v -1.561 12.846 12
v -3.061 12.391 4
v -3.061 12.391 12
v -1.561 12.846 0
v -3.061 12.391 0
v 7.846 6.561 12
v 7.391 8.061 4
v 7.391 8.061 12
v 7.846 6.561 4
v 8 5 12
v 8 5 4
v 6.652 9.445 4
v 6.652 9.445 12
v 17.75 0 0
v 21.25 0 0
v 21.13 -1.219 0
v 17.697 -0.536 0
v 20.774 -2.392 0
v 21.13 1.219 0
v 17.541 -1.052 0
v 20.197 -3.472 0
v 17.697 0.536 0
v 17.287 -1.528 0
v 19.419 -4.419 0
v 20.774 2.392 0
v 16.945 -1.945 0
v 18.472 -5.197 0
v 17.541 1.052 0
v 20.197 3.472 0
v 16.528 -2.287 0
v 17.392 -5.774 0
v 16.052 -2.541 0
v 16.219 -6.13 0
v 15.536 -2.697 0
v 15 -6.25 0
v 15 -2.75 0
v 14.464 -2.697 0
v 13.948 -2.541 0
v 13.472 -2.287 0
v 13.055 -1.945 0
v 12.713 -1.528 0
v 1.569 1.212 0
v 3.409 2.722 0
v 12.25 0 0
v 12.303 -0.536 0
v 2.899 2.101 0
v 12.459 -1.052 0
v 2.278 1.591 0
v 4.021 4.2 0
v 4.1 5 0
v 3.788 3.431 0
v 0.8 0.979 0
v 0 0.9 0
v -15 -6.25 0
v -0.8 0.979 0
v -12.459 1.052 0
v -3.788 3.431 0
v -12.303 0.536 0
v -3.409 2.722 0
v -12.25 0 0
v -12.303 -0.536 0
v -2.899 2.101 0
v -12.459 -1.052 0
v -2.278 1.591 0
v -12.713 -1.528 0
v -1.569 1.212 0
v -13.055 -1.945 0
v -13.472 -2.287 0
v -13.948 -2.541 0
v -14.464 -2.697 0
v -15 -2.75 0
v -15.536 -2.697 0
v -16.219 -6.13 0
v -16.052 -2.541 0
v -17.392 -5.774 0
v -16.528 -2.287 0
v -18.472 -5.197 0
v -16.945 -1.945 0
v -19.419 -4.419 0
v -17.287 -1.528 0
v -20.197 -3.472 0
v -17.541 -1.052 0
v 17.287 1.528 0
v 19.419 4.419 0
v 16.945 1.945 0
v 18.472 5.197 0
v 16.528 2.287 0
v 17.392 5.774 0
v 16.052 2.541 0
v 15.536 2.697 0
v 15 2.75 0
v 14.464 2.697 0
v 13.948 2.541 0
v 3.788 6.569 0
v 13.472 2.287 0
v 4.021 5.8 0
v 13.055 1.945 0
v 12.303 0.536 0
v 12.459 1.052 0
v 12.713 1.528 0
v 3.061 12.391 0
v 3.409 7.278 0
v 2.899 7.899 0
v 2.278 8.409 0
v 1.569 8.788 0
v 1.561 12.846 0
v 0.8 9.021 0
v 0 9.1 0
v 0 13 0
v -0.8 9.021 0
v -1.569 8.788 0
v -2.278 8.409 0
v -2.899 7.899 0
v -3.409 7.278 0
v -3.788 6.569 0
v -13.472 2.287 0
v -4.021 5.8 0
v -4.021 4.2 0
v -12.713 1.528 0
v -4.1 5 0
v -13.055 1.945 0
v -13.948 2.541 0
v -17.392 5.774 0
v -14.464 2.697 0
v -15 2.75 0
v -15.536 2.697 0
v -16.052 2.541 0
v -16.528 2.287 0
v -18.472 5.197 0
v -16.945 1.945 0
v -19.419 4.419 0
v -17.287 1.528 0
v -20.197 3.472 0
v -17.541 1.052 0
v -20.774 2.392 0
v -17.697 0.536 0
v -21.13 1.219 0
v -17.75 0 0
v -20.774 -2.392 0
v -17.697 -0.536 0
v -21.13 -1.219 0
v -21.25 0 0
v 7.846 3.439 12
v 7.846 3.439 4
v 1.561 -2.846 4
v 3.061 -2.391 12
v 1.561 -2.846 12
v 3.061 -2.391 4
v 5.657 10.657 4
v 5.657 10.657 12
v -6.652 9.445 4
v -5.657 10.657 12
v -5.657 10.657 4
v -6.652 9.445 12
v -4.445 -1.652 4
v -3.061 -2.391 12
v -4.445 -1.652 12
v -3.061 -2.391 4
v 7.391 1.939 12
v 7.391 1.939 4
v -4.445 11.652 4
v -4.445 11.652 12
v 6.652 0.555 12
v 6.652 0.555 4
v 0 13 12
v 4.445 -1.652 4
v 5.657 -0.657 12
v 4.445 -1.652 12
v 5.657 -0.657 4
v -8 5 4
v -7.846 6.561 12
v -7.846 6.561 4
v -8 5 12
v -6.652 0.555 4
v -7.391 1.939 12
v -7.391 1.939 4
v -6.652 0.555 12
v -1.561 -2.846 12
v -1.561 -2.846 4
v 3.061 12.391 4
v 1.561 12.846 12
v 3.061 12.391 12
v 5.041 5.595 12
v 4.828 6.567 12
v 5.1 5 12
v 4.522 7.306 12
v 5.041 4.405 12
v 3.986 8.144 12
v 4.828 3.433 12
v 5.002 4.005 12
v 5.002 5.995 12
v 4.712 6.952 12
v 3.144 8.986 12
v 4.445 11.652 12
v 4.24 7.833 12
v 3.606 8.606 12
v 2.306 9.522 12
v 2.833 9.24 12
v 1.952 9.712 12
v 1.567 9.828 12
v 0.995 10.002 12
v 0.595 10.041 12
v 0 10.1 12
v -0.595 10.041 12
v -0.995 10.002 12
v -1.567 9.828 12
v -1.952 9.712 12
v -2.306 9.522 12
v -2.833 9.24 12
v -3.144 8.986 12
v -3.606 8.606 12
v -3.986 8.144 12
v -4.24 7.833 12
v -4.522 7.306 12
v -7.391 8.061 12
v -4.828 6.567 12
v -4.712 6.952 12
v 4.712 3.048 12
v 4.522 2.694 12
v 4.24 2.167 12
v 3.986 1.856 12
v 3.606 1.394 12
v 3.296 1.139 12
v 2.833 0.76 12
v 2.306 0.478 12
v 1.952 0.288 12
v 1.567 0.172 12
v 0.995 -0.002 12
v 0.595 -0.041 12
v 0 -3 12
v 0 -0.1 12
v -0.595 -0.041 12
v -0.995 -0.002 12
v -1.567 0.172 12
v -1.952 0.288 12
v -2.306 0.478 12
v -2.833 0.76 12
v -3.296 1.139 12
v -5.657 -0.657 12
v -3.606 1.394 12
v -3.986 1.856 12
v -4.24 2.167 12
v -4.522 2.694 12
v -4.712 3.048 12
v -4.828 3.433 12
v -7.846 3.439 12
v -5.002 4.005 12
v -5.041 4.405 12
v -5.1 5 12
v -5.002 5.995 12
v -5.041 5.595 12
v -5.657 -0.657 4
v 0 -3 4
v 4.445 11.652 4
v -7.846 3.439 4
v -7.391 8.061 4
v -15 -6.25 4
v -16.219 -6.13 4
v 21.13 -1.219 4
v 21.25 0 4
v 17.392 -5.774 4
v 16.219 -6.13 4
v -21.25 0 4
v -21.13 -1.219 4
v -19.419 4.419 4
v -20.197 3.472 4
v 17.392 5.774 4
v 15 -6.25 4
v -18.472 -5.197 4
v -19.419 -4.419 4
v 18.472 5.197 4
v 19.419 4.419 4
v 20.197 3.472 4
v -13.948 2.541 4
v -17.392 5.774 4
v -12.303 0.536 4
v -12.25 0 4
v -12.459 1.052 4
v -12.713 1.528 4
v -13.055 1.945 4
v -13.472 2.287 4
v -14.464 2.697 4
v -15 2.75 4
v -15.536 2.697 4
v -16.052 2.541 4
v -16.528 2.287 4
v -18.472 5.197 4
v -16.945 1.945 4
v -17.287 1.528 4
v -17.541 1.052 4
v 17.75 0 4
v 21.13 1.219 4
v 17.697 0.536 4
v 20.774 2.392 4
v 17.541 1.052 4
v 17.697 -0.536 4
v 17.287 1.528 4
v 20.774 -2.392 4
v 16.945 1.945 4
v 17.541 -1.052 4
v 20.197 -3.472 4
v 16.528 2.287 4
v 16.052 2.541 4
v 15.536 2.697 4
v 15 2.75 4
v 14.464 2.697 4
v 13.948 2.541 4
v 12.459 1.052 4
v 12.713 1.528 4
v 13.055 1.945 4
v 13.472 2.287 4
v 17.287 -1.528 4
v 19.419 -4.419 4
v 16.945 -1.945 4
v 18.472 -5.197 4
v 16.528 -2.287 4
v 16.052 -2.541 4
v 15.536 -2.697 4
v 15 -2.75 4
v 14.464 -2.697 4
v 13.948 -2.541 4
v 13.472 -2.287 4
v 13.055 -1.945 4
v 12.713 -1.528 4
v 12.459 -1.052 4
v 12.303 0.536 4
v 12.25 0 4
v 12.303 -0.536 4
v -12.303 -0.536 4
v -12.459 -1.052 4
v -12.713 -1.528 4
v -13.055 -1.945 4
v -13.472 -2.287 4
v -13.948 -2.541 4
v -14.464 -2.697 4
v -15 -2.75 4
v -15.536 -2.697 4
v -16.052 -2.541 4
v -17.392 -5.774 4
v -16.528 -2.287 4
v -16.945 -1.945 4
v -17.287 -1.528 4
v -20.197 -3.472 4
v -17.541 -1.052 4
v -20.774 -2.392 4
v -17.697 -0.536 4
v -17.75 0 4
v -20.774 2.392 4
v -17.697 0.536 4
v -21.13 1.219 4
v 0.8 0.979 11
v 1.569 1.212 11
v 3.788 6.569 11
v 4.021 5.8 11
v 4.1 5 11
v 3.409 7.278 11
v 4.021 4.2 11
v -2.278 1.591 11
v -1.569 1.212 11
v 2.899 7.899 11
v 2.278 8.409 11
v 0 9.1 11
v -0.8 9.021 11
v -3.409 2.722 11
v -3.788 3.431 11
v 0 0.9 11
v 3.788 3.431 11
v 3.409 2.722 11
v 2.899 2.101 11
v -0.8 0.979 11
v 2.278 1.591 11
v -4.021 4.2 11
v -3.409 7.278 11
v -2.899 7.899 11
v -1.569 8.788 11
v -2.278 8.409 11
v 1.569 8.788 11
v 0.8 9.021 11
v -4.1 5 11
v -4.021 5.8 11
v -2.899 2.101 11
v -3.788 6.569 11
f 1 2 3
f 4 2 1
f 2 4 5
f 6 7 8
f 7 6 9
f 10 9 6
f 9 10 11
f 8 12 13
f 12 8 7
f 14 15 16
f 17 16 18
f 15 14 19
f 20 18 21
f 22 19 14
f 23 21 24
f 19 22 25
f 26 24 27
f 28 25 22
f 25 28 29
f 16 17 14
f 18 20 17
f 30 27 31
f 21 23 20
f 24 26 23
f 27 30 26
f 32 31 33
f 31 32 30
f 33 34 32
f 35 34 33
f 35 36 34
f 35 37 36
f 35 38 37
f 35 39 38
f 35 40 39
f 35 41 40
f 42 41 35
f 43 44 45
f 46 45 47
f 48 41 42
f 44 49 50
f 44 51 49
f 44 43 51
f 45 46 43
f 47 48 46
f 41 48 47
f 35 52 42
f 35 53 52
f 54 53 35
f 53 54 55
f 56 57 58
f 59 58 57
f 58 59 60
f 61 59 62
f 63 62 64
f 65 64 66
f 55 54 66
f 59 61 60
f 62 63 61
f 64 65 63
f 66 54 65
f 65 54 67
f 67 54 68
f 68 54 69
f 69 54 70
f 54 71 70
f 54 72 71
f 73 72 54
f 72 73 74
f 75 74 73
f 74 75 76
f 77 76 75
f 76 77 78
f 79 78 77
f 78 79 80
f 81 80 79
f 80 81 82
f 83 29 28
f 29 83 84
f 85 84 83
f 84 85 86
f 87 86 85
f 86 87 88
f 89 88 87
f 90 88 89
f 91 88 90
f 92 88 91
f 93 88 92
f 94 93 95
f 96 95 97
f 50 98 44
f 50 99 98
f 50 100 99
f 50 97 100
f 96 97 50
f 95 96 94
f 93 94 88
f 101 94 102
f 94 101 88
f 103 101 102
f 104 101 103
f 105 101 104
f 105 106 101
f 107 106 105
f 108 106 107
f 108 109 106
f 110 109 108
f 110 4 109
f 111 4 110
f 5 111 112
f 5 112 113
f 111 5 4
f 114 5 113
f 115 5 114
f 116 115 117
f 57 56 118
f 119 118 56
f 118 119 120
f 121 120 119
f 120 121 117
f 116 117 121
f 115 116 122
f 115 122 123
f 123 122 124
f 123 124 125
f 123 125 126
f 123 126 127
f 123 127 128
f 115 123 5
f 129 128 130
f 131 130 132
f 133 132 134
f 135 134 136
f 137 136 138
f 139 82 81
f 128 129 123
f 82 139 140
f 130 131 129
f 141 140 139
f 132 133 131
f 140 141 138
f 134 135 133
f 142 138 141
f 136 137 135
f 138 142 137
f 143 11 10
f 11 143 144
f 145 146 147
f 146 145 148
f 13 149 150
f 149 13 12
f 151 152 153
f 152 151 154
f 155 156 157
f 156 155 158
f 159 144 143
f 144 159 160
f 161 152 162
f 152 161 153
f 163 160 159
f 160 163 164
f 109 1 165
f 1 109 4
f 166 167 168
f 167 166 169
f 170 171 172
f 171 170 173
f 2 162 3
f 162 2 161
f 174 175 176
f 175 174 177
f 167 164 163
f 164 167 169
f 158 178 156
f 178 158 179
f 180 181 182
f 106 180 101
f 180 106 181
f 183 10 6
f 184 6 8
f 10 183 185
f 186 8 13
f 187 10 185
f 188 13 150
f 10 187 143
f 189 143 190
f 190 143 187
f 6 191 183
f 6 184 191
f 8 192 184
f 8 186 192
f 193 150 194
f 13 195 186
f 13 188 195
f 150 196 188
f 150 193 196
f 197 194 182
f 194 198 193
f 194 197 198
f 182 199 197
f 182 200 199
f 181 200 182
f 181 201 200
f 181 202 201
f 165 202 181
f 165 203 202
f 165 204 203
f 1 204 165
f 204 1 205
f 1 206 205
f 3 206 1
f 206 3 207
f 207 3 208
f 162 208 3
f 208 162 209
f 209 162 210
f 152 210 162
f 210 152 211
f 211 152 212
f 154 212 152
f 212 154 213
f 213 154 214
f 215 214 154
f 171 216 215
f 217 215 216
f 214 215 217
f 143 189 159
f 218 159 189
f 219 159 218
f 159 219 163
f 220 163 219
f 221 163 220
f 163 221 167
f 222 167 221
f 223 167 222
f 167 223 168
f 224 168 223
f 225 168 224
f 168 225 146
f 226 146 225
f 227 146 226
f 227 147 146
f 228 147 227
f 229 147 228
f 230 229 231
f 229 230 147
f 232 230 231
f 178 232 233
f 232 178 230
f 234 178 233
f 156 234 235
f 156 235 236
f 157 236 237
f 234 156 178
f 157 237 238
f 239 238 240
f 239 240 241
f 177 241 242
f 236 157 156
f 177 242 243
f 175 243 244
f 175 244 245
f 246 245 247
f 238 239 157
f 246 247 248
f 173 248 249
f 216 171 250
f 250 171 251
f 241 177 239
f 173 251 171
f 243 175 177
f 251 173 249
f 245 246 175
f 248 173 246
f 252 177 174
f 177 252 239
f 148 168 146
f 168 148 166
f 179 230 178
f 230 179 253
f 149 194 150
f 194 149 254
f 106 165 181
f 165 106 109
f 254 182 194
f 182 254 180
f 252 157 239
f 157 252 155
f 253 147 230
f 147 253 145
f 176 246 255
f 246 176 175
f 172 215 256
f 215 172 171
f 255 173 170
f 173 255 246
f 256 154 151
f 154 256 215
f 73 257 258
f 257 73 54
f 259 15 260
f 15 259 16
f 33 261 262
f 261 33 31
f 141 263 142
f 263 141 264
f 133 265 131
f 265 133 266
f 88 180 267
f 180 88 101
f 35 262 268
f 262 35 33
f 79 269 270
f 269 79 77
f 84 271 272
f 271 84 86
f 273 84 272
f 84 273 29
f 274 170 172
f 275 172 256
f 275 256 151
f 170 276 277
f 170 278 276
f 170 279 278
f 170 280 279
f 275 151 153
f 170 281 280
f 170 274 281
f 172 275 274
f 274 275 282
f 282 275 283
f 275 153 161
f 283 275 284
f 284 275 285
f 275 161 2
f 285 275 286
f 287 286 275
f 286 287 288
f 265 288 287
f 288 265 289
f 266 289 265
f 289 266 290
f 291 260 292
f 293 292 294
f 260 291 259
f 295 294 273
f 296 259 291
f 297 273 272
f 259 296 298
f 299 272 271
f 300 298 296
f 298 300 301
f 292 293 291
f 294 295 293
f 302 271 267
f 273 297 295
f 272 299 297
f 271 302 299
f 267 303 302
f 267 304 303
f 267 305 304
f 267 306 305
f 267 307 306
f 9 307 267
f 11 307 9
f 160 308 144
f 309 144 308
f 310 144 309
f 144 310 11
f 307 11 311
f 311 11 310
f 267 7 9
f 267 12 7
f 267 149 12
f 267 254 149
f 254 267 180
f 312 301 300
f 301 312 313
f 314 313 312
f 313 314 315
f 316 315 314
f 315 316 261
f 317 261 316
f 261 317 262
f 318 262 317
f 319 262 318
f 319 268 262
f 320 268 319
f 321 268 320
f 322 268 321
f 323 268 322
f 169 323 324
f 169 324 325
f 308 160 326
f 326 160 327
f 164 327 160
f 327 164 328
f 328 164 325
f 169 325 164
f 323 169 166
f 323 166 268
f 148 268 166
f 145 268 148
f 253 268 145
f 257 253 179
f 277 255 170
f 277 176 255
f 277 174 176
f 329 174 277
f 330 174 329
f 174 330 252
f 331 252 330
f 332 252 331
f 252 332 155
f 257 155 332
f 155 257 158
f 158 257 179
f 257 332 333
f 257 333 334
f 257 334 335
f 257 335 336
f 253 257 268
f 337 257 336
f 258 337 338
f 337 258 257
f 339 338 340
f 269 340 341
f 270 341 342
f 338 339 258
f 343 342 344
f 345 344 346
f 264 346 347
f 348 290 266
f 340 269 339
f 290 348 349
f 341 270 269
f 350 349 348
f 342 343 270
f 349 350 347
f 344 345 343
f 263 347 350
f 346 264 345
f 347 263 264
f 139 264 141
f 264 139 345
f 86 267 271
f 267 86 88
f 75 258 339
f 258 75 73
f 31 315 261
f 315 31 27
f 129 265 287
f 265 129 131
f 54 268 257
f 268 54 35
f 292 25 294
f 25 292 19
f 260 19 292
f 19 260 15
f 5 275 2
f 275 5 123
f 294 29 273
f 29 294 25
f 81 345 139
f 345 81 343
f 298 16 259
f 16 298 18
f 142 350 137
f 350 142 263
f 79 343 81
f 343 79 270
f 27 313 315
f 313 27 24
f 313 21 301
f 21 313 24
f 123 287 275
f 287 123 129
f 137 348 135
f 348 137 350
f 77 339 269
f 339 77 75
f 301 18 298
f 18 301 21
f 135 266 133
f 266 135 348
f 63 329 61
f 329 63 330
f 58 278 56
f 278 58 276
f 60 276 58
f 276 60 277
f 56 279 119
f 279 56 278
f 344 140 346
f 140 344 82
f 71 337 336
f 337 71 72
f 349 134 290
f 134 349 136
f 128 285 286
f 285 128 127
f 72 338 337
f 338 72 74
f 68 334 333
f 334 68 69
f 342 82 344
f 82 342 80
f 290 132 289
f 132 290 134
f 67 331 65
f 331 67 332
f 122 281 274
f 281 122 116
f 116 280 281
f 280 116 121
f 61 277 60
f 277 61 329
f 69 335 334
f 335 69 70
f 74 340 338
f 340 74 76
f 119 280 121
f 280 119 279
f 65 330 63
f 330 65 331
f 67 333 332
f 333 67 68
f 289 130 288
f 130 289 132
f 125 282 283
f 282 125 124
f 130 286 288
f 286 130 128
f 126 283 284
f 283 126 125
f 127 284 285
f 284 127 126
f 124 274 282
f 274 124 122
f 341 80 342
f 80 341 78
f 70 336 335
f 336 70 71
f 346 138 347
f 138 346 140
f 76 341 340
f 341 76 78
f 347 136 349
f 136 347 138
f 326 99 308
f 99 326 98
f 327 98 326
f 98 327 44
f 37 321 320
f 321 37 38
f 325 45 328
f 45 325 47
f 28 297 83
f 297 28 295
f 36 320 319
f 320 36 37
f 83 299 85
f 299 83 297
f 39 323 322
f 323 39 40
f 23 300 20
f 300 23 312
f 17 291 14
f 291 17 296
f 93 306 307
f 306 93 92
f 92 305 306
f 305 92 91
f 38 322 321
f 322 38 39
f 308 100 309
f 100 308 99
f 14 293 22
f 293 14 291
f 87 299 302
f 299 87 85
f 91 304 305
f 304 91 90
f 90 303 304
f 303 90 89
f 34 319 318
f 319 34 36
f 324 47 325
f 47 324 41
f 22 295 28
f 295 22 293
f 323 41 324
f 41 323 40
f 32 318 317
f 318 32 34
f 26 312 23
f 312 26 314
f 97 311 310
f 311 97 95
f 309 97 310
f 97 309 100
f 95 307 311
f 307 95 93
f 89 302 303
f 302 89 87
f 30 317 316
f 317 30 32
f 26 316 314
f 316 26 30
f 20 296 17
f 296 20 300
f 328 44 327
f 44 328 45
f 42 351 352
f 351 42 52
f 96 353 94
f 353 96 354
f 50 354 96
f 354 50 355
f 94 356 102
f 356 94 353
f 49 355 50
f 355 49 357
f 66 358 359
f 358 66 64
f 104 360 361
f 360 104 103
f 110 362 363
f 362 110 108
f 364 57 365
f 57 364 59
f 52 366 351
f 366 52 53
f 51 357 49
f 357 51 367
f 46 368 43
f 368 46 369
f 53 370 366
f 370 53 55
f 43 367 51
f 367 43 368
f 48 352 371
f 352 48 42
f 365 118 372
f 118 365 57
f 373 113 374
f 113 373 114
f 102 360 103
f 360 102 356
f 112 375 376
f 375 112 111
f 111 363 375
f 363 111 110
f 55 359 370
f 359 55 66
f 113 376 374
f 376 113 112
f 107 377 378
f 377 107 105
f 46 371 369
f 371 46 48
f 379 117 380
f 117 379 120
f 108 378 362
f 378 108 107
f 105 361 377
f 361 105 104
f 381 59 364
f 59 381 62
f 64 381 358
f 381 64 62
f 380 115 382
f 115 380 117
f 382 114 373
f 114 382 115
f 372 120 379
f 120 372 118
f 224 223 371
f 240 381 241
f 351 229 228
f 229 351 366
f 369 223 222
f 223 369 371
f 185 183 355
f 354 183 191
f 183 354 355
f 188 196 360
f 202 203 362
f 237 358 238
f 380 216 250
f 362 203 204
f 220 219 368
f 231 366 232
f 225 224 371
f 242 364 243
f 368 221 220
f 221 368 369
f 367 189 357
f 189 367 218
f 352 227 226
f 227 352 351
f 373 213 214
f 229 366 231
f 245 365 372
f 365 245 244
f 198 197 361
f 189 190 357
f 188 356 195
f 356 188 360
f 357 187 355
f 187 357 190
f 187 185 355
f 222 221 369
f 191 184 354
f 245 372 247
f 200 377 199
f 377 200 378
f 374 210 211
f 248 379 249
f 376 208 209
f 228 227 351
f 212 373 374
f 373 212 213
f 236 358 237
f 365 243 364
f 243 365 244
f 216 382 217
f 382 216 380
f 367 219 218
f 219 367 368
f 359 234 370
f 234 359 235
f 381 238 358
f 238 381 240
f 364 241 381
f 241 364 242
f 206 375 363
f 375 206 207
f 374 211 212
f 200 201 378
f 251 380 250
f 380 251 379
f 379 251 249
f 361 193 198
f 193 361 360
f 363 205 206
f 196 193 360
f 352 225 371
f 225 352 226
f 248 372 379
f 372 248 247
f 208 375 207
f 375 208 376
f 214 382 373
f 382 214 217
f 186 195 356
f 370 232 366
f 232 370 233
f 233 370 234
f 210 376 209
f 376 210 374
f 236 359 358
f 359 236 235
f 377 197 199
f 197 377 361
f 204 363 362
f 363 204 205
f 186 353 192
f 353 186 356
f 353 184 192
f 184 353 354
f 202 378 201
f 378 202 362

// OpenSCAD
// file: modules.scad
// Fonctions personnalisées

//http://forum.openscad.org/Wish-mirror-copy-true-td10681.html
module copy_mirror(vec=[0,1,0])
{
    children();
    mirror(vec) children();
}

module ecrou(plat,h){
  cylinder(d=plat*2/sqrt(3), h=h, $fn=6);
}


module courroie(diam,longueur){
  color ("black")
  difference(){
    hull(){
      cylinder(d=diam+1, h=6, $fn=32);
      translate([longueur,0,0]) cylinder(d=diam+1, h=6, $fn=32);
    }
    translate([0,0,-1])
    hull(){
      cylinder(d=diam-1, h=8, $fn=32);
      translate([longueur,0,0]) cylinder(d=diam-1, h=8, $fn=32);
    }
  }
  
  
}
// file: config.scad
// Paramètres de la machine

decal=-30;            // décallage du chassis xz
hauteur=400;          // hauteur totale chassis
largeur=400;          // largeur totale chassis
longueur=470;         // longueur totale chassis
hauteur_base=90;      // hauteur de la base
entraxe_y=140;        // distance entre les tiges Ø8 axe Y
entraxe_x=45;         // distance entre les tiges Ø8 axe X

couleur=[1,0.6,0];



// Paramètre des pièces et jeux

// écart plateau/courroie
// y_belt_holder
belt_h=13;      // écart entre la courroie et le plateau

// écart plateau/tiges lisses
// y_lm8uu
decal_plateau=12; // Décallage en Y

// décallage des tiges lisses Y
// support_tige8_y
decal_tiges=5;

// décallage moteur Y
// y_motor
decal_motory_z=11;
decal_motory_y=25;

// Equerres de fixation position fermée
eq_ec=10;      // écart entre profilés

// Fixations axe Z
pos_z=26;      // position des axes par rapport au profilé (>= 21)
hauteur_z=20;  // hauteur des fixations
entraxe_z=17;  // distance entre les tiges Ø8 et M5
// est ce que la tige de 8 dépasse du profilé de 30?
// si oui, on décale les fixations
decalx=max(-42/2+entraxe_z+8/2+2, 0);

// Roulements linéaires
lbd = 15; // diamètre ext
lbh = 24; // hauteur

// x_carriage
he_x=23;  // entraxe hotend x
he_y=23;  // entraxe hotend y
sen_x=13; // entraxe capteur x
sen_y=23; // entraxe capteur y

// Plats écrous
ec3=5.7;
ec4=7.2;
ec5=8.2;
ec6=10.2;

// Jeu sur plats pour les écrous glissants
jec=0.2;

// hauteur écrous
ec3h=2.4;
ec4h=3.2;
ec5h=4.7;
ec6h=5.2;

// Vis
vis3=3.5;
vis4=4.5;
vis5=5.5;
vis6=6.5;

// nombre de dents des poulies
poulie=20;

// Pas des courroies
pas=2;

// diamètre des poulies
dpoulie=poulie*pas/3.1416;
// main file
// eLKa1
// support_tige8_y
// GNU GPL v3
// lkiefer <blog.lkiefer.org> and contributors
// http://www.reprap.org/wiki/ELKa
// https://github.com/kimented/elka1

include <config.scad>;
use <modules.scad>;

//import("stl/support_tige8_y.stl");
module support_tige8_y(){
  ep=4;
  h=12;
  d1=8.2;
  d2=16;
  vis=5.5;
  $fn=32;
  
  echo ("support_tige8_y");

  color (couleur)
  difference(){
    union(){
      translate([0,decal_tiges,0]) cylinder(d=d2, h=h);
      hull(){
        copy_mirror(1,0,0) translate([-15,0,0]) cylinder(d=vis+7, h=ep);
        translate([0,decal_tiges,0]) cylinder(d=d2, h=ep);
      }
    }
    translate([0,decal_tiges,-1]) cylinder(d=d1, h=h+2);
    translate([0,decal_tiges,h-1]) cylinder(d1=d1,, d2=d1+4, h=2);
    copy_mirror(1,0,0) translate([-15,0,-1]) cylinder(d=vis, h=ep+2);
  }
}

support_tige8_y();
